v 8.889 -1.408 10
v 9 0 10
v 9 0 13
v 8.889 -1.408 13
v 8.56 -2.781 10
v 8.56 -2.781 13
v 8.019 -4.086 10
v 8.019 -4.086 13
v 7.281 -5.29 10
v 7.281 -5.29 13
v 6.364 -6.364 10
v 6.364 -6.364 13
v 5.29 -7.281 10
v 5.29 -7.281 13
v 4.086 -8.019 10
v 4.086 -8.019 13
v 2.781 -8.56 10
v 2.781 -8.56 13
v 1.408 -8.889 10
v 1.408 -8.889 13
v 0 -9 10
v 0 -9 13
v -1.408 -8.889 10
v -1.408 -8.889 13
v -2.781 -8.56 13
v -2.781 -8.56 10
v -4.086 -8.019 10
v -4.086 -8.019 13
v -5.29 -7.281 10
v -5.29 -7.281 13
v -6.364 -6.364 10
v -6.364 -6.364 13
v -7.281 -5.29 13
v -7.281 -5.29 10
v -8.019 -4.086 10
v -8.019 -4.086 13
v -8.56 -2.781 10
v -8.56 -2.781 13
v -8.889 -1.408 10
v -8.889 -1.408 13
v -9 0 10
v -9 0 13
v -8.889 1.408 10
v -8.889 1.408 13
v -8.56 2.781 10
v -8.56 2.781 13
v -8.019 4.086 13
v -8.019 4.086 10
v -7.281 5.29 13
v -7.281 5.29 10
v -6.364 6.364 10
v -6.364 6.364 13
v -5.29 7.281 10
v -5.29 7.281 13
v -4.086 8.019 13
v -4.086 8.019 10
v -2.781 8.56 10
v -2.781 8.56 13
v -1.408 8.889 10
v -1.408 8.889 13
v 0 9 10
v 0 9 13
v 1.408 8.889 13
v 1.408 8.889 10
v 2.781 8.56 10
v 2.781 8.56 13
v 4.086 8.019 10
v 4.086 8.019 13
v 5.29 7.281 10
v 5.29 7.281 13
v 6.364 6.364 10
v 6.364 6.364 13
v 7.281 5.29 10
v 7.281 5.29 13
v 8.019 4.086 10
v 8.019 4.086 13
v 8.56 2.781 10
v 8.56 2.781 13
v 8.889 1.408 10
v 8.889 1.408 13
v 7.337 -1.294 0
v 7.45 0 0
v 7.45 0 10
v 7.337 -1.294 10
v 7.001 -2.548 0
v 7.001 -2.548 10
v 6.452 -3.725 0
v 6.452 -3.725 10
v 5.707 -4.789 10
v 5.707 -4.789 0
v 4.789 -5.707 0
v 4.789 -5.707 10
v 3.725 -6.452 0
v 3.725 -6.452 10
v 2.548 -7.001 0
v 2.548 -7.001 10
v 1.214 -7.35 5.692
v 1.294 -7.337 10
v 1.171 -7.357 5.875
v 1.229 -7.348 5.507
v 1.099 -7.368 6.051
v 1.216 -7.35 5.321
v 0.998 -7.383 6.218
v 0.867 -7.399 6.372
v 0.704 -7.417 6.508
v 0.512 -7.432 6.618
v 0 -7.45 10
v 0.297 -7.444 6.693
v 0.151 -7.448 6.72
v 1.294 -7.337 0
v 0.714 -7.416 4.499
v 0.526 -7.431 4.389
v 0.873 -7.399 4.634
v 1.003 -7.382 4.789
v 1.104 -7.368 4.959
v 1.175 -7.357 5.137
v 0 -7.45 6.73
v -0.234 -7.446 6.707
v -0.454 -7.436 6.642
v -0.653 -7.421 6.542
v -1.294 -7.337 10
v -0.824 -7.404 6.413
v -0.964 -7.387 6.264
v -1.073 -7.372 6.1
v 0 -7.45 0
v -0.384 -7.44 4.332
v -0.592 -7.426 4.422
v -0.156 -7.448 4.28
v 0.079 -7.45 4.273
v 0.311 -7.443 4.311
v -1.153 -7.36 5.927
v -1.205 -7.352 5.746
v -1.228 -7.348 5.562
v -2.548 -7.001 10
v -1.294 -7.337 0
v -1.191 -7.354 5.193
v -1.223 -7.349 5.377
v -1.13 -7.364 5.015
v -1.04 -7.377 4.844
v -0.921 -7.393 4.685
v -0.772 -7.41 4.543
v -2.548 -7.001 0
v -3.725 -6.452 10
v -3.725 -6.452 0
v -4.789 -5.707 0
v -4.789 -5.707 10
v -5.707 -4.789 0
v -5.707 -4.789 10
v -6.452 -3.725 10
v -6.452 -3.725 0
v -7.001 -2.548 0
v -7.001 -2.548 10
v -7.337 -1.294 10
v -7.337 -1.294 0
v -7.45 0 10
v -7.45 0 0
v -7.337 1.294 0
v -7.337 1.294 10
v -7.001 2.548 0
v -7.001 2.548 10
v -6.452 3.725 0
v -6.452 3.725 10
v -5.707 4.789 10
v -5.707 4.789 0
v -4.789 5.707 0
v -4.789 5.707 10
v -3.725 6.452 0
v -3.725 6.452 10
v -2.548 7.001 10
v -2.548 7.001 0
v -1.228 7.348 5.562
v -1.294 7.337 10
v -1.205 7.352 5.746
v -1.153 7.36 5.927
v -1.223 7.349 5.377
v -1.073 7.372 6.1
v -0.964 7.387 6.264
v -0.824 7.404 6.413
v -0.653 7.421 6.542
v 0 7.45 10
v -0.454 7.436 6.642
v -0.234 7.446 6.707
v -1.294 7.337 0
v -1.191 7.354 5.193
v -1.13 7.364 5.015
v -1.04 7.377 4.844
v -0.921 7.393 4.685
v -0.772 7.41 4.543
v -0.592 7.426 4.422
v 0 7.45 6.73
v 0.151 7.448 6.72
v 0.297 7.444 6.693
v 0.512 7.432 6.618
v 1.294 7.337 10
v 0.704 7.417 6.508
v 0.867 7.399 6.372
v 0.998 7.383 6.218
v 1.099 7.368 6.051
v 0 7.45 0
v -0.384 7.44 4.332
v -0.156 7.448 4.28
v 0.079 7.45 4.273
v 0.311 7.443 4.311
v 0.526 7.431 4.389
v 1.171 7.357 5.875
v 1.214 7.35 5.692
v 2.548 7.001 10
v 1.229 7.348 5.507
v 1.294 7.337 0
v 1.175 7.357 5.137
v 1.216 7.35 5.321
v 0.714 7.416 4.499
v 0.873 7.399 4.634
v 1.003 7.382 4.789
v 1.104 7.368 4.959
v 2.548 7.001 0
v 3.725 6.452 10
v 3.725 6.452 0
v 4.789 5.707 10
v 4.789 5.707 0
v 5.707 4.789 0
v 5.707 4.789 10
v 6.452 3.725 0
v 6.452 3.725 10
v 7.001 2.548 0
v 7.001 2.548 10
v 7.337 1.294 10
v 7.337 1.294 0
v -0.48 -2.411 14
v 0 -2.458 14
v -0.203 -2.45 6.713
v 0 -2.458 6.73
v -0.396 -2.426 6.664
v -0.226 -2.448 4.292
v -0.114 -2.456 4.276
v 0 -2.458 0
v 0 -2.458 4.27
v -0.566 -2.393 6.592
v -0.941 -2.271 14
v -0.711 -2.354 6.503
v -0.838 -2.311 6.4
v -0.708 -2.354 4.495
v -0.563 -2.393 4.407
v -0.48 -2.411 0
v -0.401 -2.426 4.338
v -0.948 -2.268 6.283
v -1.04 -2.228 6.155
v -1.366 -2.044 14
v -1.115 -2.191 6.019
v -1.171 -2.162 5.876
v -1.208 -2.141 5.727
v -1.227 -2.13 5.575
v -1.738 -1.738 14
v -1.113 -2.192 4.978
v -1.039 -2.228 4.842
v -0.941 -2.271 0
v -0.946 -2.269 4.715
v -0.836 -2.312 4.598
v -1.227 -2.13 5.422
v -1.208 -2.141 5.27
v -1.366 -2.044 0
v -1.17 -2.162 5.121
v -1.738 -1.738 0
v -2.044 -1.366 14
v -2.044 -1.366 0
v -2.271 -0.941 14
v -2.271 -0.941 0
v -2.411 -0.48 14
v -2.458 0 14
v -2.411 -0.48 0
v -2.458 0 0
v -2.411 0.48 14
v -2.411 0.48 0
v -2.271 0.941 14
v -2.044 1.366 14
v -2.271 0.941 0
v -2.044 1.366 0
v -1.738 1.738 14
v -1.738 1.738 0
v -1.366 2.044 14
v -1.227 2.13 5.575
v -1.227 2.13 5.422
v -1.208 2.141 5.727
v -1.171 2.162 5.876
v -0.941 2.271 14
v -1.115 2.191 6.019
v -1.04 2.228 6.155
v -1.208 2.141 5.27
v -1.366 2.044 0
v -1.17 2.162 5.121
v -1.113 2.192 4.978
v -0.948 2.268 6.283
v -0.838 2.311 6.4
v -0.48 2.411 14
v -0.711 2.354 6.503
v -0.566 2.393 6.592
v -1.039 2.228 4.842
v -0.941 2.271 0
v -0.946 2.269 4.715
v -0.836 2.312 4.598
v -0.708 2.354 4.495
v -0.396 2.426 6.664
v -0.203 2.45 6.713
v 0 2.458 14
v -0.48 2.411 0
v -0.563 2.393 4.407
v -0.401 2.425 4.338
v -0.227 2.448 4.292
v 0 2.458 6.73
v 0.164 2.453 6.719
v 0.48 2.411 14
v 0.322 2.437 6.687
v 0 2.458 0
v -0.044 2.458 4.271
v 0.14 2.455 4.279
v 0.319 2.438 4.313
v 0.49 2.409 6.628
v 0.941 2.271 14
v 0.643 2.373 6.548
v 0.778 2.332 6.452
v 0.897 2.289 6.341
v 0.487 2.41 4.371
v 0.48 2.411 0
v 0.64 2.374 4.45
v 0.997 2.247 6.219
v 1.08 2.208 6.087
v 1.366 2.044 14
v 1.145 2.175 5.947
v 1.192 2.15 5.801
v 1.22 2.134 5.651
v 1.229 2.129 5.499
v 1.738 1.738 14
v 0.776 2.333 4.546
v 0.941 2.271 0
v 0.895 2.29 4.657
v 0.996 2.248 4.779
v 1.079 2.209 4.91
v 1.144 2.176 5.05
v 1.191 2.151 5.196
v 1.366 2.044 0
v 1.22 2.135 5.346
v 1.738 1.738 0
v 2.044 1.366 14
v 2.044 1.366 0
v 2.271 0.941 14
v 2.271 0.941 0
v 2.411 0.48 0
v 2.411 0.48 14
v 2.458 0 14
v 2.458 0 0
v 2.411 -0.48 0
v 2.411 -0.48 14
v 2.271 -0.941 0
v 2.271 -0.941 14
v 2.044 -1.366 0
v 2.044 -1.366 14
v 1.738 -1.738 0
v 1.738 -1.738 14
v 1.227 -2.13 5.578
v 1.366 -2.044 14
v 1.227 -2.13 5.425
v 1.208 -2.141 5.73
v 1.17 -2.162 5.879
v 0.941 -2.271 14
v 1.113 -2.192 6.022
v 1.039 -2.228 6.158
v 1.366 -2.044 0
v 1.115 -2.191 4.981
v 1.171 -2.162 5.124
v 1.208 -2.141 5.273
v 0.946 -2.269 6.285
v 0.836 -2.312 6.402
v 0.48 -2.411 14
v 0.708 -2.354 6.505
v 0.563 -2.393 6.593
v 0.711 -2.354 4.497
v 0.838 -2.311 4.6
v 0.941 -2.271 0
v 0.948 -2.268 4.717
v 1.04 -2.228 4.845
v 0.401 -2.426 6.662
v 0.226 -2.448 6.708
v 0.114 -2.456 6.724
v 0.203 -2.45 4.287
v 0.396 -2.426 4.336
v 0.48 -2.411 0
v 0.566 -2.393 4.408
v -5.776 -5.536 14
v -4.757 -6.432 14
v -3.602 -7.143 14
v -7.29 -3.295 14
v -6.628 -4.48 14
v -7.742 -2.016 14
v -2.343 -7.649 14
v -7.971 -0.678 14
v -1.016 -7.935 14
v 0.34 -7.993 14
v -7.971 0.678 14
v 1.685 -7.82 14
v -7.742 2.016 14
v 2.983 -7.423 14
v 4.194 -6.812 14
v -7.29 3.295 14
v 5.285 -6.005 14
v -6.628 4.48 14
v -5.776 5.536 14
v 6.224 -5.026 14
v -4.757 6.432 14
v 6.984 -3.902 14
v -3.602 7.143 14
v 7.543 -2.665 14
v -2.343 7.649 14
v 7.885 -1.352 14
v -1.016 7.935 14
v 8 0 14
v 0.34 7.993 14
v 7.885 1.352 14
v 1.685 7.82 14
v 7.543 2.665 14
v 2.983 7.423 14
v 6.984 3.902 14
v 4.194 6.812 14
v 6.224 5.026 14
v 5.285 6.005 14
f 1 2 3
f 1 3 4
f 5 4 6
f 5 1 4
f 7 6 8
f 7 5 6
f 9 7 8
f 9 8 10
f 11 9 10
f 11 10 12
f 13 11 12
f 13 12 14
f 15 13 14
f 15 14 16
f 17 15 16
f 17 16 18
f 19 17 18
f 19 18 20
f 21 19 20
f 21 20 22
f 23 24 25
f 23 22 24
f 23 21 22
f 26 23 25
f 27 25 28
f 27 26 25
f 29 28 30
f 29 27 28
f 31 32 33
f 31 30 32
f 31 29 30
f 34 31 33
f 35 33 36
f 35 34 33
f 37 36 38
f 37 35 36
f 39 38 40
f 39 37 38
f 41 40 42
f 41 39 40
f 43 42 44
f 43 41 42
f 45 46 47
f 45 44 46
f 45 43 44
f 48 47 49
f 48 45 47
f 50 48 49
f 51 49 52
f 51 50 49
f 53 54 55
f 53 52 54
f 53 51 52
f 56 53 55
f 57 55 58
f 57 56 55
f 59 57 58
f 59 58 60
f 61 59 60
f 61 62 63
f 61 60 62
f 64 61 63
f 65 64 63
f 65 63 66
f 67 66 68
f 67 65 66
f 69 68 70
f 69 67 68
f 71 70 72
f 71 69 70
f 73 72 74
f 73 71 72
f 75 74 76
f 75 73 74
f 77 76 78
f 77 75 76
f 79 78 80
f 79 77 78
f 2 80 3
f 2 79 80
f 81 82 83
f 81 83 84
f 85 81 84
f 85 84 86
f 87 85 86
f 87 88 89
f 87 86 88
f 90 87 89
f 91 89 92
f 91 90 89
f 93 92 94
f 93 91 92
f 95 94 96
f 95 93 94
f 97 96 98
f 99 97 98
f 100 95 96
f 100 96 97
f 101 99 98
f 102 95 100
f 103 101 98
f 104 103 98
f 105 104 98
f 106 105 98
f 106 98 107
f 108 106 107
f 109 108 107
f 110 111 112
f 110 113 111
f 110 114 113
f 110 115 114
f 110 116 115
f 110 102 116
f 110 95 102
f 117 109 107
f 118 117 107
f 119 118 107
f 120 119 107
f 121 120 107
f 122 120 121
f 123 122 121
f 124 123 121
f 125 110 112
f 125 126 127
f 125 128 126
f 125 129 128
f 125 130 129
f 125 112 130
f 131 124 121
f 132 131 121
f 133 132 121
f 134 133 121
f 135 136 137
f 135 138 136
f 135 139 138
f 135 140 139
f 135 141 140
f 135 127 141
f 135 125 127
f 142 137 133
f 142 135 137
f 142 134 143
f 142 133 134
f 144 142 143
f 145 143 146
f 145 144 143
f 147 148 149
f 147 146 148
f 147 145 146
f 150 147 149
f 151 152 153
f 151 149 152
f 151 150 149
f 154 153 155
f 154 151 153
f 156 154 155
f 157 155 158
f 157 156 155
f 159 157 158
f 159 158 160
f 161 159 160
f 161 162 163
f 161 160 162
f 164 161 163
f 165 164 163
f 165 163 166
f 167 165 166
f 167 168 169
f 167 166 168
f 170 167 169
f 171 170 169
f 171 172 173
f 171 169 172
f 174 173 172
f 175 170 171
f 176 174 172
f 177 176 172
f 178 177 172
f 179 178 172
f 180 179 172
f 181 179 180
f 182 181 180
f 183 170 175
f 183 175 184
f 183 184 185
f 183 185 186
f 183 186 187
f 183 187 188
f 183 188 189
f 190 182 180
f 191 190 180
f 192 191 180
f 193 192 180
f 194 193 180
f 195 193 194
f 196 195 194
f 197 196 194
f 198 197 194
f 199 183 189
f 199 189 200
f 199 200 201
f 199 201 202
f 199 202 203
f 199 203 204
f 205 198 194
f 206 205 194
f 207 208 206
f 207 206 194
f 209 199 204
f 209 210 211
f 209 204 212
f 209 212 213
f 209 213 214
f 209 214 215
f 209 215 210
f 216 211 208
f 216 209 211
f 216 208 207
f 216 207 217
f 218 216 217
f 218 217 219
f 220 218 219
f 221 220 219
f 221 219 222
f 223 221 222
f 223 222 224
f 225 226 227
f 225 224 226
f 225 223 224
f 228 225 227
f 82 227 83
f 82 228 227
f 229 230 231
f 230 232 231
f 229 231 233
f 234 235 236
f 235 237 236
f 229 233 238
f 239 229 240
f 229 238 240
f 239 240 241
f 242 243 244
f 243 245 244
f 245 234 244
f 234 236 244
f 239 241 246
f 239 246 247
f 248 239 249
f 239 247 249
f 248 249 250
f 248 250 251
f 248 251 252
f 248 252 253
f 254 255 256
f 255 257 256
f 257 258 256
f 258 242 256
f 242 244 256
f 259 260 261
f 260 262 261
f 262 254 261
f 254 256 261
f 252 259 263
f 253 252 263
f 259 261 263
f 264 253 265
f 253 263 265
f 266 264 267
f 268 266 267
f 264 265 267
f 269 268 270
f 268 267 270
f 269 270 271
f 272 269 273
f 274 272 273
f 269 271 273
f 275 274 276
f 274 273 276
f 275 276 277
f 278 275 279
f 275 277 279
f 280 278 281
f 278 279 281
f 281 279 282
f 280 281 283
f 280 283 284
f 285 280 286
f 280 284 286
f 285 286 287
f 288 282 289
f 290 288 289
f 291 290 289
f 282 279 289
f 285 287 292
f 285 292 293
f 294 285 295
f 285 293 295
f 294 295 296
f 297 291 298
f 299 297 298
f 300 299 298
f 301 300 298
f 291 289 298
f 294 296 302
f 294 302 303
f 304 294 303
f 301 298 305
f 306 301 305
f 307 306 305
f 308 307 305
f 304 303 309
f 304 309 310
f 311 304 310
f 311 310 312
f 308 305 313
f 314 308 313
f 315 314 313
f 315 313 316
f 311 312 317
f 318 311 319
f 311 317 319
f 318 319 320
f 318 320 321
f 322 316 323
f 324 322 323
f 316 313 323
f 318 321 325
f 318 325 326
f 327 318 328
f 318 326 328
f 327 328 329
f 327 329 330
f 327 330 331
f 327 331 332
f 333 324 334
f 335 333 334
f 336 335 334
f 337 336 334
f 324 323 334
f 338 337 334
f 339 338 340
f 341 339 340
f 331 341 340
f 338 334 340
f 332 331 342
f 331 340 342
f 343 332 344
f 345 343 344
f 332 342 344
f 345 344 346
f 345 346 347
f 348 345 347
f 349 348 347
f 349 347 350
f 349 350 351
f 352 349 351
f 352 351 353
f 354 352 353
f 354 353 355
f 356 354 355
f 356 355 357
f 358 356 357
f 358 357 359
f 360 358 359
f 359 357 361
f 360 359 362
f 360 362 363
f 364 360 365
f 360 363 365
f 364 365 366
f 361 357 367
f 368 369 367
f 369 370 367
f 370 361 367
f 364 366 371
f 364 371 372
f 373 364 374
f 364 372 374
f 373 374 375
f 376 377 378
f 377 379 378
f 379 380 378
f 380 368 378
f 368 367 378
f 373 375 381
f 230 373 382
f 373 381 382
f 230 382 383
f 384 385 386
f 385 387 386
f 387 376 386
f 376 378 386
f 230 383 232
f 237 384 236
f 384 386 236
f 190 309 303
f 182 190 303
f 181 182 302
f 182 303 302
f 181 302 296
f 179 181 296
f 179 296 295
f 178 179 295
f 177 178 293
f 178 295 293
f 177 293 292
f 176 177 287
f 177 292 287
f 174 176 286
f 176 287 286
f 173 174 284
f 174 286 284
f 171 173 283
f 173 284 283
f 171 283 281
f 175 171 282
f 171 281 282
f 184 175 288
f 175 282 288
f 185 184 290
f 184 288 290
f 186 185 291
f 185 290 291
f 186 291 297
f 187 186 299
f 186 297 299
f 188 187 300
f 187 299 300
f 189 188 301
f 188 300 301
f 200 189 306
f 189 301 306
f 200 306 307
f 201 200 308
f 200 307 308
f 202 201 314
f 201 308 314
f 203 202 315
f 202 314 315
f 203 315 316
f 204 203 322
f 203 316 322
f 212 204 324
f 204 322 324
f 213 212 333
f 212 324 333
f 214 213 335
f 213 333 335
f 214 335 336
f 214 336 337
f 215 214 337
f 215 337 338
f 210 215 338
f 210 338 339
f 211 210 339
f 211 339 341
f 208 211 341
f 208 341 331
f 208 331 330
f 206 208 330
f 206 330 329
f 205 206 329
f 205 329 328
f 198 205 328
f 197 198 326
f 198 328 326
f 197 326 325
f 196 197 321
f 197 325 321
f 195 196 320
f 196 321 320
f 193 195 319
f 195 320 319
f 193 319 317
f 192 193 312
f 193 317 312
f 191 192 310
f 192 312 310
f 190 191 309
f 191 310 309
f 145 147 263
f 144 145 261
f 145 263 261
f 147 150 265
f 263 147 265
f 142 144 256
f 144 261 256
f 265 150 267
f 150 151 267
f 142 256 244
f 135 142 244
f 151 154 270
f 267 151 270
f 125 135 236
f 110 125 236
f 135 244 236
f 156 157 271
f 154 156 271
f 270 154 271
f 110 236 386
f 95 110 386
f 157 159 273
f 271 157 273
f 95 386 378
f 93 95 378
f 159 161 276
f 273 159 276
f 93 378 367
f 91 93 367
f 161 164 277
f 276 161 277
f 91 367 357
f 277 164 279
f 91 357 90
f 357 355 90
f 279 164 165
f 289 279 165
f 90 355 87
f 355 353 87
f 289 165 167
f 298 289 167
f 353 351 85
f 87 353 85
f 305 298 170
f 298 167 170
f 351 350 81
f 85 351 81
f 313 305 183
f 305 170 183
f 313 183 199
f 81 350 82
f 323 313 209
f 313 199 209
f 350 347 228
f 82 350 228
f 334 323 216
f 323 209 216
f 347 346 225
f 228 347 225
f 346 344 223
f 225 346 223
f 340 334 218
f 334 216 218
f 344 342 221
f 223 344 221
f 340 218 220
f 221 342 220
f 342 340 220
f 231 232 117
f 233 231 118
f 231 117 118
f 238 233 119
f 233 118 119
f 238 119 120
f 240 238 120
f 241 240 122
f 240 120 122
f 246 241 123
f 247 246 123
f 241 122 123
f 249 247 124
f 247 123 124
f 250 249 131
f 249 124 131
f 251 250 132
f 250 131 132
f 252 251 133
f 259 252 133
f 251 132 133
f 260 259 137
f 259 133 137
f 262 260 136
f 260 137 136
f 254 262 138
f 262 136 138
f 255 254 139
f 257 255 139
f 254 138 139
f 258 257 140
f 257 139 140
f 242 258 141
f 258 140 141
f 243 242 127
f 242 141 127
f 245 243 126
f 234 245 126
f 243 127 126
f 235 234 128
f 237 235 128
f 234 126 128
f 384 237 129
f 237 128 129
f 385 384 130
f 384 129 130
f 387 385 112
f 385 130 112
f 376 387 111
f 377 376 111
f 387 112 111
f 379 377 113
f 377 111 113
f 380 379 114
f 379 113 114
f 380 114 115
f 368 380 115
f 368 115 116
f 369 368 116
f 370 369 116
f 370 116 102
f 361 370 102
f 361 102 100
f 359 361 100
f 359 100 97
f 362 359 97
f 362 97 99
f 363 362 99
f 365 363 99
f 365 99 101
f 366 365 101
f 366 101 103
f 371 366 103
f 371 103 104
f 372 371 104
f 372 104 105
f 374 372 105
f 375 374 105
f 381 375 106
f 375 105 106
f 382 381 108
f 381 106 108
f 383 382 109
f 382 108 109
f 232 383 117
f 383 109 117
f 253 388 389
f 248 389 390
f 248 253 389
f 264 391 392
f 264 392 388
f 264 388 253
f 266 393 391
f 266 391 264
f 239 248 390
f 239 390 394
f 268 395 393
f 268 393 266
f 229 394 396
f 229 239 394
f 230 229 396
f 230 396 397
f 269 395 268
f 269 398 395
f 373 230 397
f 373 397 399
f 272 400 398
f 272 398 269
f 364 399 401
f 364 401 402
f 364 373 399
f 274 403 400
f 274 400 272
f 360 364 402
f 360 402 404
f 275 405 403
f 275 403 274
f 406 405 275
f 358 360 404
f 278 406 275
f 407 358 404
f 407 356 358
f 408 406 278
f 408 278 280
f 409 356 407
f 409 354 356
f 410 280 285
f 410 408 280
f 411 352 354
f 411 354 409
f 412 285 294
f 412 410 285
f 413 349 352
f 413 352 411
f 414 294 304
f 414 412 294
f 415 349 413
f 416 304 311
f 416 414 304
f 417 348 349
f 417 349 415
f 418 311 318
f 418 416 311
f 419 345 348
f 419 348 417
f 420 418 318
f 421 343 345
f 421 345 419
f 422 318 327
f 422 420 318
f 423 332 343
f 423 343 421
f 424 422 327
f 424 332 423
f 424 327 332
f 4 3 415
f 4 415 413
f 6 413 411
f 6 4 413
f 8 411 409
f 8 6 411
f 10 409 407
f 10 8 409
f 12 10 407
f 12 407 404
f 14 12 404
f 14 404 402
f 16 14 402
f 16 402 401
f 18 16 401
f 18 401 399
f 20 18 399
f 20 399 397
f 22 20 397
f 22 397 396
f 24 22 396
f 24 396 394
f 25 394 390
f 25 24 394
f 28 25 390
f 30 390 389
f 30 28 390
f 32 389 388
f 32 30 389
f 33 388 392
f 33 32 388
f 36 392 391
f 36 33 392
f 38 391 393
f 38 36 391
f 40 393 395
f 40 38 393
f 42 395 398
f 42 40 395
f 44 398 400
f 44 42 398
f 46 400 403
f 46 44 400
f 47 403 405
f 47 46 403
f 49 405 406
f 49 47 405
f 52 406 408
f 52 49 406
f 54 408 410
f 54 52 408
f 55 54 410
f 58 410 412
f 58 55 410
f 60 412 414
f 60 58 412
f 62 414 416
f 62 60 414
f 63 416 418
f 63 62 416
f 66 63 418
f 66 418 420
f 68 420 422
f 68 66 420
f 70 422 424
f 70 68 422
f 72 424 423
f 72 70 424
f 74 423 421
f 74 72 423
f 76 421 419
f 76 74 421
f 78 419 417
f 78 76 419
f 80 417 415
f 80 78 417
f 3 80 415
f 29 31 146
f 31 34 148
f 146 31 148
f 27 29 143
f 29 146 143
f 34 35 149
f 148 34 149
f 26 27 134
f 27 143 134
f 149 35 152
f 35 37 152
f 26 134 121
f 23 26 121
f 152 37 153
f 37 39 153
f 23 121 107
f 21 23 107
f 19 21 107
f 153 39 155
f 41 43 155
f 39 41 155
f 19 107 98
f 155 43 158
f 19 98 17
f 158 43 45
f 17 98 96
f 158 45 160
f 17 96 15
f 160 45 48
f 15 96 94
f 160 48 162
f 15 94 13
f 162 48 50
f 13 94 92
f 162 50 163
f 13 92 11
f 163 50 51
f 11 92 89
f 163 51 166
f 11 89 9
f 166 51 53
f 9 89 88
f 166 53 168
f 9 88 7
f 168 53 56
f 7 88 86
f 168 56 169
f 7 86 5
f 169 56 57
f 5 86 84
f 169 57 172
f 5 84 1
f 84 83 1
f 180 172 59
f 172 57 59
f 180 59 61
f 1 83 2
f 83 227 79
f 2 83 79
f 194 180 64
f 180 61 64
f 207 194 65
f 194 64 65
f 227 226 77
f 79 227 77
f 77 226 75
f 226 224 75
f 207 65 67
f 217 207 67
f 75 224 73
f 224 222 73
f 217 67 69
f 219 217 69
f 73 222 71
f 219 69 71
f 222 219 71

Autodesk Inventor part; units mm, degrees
ref_plane "YZ Plane" through (0, 0, 0) normal (1, 0, 0) x (0, 1, 0)
ref_plane "XY Plane" through (0, 0, 0) normal (0, 0, 1) x (1, 0, 0)
sketch "Mount" plane through (0, 0, 0) normal (0, 0, 1) x (1, 0, 0)
  circle A0 centre (0, 0) radius 7.45
  dimension "d0" = 14.9
extrude "MountFeature" add sketch "Mount" along normal blind 10
sketch "Base" plane through (0, 0, 10) normal (0, 0, 1) x (1, 0, 0)
  circle A0 centre (0, 0) radius 7.45 construction
  circle A1 centre (0, 0) radius 9
  dimension "d3" = 18
extrude "BaseFeature" add sketch "Base" along normal blind 4
sketch "RodEndHole" plane through (0, 0, 14) normal (0, 0, 1) x (1, 0, 0)
  circle A0 centre (0, 0) radius 9 projected
hole "RodEndHoleFeature" at (0, 0, 14) direction (0, 0, -1) diameter 4.917 end through all thread size "M6x1" class "6H" standard "ISO Metric profile"
chamfer "BaseChamferFeature" distance 1 angle 45 1 edges at (-9, 0, 14)
ref_plane "MidSidePlane" through (0, 12, 0) normal (0, 1, 0) x (-1, 0, 0)
sketch "MountHole" plane through (0, 12, 0) normal (0, 1, 0) x (-1, 0, 0)
  line L0 (-9, 10) -> (9, 10) construction
  line L1 (7.45, 0) -> (7.45, 10) construction
  line L2 (7.45, 10) -> (-7.45, 10) construction
  line L3 (-7.45, 0) -> (7.45, 0) construction
  point P0 (0, 5.5)
  dimension "d18" = 4.5
  dimension "d26" = 18
  dimension "d27" = 9
hole "MountHoleFeature" at (0, 12, 5.5) direction (0, -1, 0) diameter 2.459 end through all thread size "M3x0.5" class "6H" standard "ISO Metric profile"
equation "\"d27\" = 0.5 * d26"
properties part number "BackPair1PistonBottomCap"
